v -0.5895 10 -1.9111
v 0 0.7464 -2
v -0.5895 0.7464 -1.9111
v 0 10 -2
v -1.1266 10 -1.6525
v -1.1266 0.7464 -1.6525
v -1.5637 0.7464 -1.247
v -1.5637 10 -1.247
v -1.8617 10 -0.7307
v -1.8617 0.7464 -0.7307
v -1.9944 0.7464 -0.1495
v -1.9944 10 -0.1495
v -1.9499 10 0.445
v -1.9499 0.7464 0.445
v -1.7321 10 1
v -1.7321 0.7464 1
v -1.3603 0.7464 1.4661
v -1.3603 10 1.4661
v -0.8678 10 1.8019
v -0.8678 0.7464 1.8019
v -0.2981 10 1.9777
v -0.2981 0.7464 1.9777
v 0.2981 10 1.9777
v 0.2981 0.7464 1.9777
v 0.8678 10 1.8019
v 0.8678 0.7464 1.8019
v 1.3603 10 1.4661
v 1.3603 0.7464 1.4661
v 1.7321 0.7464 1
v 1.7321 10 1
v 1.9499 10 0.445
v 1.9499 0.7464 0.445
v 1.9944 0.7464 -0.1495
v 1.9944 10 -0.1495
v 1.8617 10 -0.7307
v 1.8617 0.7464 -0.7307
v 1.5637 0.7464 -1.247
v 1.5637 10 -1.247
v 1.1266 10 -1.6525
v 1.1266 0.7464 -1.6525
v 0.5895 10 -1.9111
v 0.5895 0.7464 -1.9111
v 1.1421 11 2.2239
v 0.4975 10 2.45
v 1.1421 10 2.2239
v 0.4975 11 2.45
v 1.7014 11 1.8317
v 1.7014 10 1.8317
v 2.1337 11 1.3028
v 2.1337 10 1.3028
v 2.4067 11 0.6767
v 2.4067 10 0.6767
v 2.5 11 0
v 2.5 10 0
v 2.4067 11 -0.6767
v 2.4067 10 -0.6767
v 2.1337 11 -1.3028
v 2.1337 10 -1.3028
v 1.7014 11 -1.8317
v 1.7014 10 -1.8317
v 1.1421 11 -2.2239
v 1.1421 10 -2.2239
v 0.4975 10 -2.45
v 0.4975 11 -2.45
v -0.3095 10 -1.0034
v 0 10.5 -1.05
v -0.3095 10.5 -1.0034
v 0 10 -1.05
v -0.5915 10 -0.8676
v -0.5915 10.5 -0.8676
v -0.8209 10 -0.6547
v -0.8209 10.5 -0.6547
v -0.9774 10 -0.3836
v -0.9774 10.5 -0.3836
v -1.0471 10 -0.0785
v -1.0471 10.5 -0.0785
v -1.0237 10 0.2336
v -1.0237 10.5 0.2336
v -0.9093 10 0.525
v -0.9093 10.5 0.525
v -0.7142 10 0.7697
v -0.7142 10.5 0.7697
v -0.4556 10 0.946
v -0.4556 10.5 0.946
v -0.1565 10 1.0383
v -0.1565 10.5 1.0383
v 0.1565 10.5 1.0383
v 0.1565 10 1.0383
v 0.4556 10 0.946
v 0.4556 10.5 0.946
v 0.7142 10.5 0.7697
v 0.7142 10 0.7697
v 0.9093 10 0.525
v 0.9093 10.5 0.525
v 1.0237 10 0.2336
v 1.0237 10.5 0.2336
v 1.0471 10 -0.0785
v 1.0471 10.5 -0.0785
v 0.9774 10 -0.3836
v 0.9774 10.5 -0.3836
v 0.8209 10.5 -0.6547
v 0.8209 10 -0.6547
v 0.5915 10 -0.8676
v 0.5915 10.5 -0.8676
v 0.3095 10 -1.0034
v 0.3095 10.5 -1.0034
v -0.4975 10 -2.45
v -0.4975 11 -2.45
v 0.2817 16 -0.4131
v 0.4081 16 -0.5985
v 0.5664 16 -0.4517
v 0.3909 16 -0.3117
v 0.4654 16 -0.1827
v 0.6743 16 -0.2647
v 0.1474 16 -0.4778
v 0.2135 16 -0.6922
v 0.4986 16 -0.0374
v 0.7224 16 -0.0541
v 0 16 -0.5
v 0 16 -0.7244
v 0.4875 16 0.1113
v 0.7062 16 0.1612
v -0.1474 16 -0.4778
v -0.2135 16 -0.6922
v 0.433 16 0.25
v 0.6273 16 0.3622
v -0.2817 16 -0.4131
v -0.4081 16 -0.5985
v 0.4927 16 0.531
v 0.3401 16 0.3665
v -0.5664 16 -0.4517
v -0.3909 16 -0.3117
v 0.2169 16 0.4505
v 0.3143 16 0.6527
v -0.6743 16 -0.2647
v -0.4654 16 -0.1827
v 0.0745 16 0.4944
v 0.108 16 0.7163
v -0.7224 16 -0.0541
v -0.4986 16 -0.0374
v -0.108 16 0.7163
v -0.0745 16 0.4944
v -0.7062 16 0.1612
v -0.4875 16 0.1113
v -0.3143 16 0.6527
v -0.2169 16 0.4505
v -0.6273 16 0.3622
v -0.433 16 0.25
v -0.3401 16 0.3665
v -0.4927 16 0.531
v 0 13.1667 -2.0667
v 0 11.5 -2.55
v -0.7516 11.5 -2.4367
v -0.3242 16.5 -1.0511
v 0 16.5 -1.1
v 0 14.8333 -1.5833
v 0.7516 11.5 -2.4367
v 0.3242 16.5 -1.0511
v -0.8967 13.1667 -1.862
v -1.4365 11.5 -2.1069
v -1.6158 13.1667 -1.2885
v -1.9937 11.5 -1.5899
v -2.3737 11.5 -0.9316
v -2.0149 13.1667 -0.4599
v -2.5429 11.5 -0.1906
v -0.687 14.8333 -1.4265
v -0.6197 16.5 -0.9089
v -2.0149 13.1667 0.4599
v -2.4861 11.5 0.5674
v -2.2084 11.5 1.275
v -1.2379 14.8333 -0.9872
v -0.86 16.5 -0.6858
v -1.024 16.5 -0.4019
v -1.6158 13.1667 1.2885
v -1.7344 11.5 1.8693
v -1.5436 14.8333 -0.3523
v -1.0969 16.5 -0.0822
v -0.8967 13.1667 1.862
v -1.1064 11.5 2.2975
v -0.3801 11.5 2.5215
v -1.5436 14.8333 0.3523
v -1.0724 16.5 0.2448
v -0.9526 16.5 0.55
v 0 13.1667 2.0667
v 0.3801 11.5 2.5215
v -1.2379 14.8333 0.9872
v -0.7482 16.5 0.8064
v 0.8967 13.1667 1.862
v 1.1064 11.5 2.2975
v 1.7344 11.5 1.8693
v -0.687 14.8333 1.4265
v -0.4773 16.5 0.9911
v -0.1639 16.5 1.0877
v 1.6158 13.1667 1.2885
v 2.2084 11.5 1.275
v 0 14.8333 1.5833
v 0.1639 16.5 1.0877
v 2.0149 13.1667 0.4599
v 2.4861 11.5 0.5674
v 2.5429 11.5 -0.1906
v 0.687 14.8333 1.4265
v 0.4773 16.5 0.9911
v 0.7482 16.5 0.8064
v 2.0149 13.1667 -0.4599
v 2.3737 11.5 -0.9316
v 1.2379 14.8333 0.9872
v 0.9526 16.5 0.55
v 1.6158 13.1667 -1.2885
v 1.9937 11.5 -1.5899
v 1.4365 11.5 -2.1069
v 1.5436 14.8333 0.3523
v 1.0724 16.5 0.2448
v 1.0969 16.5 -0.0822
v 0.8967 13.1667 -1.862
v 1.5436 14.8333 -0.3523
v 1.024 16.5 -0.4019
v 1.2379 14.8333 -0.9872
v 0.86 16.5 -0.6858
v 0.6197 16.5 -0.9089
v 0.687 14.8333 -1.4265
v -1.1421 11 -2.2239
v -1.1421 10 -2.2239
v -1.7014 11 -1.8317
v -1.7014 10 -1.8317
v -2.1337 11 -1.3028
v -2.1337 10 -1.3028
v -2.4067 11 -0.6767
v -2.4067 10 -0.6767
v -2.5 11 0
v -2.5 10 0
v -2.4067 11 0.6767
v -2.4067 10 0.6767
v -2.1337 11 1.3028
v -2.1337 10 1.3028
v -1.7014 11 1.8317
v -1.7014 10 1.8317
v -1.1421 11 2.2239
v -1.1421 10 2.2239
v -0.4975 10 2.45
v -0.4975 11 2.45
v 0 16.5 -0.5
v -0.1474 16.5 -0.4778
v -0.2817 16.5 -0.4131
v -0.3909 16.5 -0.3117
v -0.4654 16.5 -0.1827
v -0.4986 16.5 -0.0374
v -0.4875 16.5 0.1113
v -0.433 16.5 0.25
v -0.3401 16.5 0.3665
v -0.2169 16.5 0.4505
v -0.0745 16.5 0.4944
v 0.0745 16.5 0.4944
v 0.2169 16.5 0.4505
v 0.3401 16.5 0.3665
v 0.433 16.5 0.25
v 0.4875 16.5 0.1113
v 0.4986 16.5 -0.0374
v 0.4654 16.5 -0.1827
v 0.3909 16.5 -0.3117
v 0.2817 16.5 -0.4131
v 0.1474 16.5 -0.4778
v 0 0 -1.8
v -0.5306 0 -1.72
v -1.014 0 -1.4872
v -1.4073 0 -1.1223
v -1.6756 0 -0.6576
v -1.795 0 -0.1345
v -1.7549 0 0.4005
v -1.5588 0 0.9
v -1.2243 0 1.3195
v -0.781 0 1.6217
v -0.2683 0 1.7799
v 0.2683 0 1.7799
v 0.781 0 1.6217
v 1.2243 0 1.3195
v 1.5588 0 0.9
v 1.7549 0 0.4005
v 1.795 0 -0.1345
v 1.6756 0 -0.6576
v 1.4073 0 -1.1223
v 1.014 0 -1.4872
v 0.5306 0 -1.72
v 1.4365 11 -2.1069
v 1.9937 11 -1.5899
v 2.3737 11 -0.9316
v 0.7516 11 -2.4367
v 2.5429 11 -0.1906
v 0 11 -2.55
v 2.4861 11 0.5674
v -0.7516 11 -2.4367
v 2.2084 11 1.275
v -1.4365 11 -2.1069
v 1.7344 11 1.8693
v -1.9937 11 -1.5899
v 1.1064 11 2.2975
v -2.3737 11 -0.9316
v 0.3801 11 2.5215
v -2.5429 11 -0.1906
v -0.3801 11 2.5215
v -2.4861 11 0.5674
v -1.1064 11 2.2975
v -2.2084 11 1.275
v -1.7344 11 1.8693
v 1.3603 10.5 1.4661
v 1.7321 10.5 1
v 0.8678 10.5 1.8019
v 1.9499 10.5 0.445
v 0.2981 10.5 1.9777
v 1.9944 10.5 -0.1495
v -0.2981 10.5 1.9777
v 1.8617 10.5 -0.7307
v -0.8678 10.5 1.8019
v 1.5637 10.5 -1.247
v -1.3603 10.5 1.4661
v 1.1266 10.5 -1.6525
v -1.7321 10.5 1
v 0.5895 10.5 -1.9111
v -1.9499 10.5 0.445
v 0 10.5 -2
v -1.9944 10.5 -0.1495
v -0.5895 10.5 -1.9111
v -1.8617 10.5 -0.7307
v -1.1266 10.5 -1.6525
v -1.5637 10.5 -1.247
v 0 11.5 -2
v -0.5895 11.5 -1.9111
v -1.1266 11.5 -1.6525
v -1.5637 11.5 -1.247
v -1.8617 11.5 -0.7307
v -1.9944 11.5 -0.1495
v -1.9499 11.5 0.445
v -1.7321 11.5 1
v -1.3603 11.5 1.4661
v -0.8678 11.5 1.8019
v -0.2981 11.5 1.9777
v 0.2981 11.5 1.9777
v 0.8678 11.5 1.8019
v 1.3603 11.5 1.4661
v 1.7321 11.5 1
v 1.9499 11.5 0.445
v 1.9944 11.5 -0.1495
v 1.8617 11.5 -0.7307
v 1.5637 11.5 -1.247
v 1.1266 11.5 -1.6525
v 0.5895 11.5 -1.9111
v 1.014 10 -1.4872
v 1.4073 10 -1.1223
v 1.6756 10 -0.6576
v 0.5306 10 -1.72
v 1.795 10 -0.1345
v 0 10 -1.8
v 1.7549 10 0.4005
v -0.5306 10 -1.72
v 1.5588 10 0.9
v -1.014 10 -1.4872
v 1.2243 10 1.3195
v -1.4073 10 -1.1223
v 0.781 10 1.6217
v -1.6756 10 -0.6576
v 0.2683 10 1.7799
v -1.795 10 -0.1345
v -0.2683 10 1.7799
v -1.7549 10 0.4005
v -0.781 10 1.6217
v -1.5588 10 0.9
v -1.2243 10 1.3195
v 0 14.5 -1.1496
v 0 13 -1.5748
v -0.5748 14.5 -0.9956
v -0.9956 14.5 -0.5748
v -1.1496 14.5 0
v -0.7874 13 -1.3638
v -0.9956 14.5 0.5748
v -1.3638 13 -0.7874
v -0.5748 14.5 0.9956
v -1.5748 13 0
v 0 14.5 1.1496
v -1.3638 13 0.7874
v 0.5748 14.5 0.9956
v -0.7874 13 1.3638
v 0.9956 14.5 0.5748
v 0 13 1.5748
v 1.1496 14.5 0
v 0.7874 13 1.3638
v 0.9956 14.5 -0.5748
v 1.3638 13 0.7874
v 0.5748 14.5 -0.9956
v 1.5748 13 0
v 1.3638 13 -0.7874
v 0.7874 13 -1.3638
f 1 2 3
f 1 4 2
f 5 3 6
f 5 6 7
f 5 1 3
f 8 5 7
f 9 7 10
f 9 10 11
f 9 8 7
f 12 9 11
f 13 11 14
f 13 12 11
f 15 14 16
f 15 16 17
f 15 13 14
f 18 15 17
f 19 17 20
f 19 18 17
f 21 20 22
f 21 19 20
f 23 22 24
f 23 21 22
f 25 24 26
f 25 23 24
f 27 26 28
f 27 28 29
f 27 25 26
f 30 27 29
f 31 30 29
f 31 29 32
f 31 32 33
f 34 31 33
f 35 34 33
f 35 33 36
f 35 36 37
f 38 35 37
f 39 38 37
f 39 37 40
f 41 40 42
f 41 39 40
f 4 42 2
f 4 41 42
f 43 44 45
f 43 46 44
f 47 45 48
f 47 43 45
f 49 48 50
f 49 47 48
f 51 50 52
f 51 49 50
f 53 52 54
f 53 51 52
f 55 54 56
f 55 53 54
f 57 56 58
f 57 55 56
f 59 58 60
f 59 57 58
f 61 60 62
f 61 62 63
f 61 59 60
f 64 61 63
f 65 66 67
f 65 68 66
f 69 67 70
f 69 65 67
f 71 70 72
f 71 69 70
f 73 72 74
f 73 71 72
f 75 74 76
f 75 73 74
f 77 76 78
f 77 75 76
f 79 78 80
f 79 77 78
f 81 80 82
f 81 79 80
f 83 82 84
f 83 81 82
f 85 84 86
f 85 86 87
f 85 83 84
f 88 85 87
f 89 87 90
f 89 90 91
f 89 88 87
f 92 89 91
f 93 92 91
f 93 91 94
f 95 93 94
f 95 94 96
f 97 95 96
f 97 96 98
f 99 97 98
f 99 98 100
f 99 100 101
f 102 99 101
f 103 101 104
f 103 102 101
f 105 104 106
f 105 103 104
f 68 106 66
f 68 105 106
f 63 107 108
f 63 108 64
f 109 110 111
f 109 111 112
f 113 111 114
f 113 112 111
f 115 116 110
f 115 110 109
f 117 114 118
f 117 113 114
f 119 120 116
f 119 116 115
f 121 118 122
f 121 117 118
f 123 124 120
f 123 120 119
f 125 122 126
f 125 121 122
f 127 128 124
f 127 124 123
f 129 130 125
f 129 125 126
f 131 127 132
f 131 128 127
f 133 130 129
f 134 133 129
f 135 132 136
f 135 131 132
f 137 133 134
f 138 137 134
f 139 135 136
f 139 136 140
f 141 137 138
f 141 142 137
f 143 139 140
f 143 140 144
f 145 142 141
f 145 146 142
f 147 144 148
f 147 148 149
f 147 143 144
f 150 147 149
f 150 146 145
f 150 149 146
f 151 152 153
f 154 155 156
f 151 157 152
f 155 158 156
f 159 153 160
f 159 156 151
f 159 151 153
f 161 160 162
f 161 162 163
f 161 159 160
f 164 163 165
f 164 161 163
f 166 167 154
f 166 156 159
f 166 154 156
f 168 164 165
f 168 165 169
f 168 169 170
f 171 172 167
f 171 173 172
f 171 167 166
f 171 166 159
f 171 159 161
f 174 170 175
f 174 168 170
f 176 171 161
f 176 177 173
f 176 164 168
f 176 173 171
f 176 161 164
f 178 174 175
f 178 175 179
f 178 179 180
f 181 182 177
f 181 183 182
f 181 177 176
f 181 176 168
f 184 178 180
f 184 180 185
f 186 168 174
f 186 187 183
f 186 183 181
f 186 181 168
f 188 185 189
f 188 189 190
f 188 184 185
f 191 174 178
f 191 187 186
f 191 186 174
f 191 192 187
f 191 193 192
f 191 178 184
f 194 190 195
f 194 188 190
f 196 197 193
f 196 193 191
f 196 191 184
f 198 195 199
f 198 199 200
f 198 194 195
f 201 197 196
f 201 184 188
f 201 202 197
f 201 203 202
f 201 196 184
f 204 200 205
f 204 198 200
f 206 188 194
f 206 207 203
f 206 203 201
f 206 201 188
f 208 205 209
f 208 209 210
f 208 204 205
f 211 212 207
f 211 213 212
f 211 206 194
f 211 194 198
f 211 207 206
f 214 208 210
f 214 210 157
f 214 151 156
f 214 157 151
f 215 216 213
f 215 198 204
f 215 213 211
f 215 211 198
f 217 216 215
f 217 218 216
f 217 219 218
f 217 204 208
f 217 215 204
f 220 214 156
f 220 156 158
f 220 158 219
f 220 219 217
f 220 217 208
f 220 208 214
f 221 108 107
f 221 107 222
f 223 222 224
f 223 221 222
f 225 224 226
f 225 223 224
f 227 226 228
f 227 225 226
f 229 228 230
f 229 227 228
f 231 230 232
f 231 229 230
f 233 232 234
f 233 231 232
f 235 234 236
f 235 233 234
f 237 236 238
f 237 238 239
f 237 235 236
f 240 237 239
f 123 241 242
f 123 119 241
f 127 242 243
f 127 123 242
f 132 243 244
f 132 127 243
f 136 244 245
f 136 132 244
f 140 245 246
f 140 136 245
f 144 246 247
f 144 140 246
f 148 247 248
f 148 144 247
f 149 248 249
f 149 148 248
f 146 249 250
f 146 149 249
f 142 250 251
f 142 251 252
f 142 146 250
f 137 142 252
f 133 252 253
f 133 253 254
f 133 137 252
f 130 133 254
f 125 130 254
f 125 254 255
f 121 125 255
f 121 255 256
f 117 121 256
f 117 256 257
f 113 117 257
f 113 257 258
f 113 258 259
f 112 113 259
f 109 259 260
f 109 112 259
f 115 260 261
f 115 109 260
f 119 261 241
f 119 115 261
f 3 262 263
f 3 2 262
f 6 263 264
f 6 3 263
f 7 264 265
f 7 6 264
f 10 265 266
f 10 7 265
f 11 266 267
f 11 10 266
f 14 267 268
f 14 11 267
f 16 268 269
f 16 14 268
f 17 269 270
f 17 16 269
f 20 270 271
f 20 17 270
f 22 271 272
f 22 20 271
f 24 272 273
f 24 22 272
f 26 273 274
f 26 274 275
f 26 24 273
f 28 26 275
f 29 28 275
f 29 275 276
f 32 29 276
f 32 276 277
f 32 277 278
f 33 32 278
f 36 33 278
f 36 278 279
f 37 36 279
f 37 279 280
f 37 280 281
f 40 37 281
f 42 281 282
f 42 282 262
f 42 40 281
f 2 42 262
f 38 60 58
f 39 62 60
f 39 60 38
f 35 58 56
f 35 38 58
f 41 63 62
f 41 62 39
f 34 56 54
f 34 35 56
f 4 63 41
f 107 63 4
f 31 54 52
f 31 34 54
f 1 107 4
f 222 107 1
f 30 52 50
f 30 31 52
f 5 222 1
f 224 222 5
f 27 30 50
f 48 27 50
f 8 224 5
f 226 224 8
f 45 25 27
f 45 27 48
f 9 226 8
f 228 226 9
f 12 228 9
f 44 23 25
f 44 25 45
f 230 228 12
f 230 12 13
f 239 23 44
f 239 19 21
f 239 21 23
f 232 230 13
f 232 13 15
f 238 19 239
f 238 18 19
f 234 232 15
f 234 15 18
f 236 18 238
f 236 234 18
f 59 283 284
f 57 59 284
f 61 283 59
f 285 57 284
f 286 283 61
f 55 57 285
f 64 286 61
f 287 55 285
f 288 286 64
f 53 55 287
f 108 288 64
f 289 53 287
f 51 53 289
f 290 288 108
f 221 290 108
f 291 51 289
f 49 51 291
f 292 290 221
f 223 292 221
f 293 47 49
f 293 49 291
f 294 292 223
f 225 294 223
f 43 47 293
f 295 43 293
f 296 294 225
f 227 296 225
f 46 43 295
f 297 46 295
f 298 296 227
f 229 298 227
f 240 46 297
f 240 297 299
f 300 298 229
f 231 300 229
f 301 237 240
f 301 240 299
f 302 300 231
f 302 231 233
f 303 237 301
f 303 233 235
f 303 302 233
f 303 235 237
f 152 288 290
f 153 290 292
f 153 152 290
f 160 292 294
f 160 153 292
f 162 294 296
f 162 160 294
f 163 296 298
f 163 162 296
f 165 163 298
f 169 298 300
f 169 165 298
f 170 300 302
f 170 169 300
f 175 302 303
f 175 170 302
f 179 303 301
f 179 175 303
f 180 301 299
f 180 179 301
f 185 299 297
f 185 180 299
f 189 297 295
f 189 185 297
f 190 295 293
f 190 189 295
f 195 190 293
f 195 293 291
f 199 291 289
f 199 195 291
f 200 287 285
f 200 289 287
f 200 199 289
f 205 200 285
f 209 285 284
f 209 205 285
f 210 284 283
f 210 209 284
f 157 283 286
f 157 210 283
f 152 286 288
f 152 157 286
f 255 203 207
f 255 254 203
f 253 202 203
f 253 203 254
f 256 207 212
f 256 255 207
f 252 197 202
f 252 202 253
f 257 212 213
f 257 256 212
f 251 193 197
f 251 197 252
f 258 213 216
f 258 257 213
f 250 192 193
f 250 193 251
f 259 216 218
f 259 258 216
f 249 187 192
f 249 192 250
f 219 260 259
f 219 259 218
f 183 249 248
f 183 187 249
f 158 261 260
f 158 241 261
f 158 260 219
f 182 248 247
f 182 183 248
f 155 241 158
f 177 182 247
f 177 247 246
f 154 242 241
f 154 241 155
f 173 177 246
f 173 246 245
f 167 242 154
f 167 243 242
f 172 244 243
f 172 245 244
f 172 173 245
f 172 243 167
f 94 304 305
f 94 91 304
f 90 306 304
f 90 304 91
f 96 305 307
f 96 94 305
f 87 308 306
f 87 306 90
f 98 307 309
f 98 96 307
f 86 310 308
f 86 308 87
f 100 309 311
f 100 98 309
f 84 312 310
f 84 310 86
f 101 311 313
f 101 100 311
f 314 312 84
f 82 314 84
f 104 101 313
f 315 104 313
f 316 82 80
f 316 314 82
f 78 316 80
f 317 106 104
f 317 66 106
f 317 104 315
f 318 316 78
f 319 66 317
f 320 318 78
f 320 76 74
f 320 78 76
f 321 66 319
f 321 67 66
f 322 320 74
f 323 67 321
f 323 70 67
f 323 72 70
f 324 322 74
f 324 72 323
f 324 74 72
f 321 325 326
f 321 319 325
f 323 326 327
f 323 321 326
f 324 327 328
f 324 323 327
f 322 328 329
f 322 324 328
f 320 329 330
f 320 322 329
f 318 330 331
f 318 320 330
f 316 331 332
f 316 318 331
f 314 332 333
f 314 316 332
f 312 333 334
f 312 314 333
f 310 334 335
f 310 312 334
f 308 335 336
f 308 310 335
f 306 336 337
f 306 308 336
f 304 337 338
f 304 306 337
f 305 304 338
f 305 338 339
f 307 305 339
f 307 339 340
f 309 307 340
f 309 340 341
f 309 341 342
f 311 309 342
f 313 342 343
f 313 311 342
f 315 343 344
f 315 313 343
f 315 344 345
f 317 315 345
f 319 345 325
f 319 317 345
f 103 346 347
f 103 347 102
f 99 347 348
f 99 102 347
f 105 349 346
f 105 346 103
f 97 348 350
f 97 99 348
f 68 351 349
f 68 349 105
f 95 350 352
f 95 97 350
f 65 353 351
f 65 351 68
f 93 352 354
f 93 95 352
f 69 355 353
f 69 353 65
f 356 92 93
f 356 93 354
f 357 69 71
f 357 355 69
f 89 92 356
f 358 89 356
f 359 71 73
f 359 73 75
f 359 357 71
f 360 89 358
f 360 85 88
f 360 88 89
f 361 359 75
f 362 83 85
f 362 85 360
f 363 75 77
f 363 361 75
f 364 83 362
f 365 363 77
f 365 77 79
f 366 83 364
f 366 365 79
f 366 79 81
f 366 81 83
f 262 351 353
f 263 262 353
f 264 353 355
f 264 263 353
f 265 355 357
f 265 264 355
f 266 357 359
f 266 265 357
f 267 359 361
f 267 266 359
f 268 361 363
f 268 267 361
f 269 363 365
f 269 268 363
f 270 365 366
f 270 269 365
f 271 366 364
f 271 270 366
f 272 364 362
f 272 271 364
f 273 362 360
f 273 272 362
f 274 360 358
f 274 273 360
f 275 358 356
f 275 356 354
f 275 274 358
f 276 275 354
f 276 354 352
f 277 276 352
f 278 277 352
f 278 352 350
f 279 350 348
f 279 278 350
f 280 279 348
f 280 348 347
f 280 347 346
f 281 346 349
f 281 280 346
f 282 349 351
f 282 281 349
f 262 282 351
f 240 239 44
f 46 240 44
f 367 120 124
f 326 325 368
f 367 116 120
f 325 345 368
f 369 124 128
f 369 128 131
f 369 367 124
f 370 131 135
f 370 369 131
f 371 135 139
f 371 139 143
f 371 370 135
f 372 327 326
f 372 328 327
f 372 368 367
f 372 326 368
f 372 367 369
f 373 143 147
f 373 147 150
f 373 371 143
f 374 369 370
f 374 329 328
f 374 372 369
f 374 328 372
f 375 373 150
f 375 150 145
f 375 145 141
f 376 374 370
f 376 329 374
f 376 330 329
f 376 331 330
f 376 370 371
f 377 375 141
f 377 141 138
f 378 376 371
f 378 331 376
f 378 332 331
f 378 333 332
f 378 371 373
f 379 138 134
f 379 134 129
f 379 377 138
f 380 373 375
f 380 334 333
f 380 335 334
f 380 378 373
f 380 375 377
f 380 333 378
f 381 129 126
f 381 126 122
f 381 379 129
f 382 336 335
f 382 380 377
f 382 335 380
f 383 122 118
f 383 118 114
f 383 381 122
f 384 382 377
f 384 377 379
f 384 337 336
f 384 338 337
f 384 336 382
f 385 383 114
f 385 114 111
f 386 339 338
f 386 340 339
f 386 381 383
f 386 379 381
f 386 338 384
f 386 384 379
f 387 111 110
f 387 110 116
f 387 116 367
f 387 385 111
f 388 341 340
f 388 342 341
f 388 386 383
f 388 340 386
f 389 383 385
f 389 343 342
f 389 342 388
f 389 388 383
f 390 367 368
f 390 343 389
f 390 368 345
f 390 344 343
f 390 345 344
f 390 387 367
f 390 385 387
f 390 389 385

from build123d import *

# Parameters (mm, degrees)
CROQUIS2_W            = 5
CROQUIS2_H            = 0.1
CORTAR_EXTRUIR1_DEPTH = 1


with BuildPart() as part:
    # Croquis1 → Revolución1 (revolve)
    with BuildSketch(Plane.XY, mode=Mode.PRIVATE) as revoluci_n1_sk:
        Polygon((1.05, 10), (1.8, 10), (1.8, 0), (2, 0.746410162), (2, 10), (2.5, 10), (2.5, 11), (2.55, 11), (2.55, 11.5), (1.1, 16.5), (0.5, 16.5), (0.5, 16), (0.724399385, 16), (2, 11.5), (2, 10.5), (1.5, 10.5), (1.05, 10.5), align=None)
    revolve(revoluci_n1_sk.sketch.rotate(Axis((0, 0, 0), (0, 1, 0)), 90), axis=Axis((0, 0, 0), (0, 1, 0)))

    # Croquis2 → Cortar-Extruir1 (cut)
    with BuildSketch(Plane.XZ.offset(-10)):
        with Locations((0, 2.5)):
            Rectangle(CROQUIS2_W, CROQUIS2_H)
        with Locations((0, -2.5)):
            Rectangle(CROQUIS2_W, CROQUIS2_H)
    extrude(amount=-CORTAR_EXTRUIR1_DEPTH, mode=Mode.SUBTRACT)


solid = part.part
